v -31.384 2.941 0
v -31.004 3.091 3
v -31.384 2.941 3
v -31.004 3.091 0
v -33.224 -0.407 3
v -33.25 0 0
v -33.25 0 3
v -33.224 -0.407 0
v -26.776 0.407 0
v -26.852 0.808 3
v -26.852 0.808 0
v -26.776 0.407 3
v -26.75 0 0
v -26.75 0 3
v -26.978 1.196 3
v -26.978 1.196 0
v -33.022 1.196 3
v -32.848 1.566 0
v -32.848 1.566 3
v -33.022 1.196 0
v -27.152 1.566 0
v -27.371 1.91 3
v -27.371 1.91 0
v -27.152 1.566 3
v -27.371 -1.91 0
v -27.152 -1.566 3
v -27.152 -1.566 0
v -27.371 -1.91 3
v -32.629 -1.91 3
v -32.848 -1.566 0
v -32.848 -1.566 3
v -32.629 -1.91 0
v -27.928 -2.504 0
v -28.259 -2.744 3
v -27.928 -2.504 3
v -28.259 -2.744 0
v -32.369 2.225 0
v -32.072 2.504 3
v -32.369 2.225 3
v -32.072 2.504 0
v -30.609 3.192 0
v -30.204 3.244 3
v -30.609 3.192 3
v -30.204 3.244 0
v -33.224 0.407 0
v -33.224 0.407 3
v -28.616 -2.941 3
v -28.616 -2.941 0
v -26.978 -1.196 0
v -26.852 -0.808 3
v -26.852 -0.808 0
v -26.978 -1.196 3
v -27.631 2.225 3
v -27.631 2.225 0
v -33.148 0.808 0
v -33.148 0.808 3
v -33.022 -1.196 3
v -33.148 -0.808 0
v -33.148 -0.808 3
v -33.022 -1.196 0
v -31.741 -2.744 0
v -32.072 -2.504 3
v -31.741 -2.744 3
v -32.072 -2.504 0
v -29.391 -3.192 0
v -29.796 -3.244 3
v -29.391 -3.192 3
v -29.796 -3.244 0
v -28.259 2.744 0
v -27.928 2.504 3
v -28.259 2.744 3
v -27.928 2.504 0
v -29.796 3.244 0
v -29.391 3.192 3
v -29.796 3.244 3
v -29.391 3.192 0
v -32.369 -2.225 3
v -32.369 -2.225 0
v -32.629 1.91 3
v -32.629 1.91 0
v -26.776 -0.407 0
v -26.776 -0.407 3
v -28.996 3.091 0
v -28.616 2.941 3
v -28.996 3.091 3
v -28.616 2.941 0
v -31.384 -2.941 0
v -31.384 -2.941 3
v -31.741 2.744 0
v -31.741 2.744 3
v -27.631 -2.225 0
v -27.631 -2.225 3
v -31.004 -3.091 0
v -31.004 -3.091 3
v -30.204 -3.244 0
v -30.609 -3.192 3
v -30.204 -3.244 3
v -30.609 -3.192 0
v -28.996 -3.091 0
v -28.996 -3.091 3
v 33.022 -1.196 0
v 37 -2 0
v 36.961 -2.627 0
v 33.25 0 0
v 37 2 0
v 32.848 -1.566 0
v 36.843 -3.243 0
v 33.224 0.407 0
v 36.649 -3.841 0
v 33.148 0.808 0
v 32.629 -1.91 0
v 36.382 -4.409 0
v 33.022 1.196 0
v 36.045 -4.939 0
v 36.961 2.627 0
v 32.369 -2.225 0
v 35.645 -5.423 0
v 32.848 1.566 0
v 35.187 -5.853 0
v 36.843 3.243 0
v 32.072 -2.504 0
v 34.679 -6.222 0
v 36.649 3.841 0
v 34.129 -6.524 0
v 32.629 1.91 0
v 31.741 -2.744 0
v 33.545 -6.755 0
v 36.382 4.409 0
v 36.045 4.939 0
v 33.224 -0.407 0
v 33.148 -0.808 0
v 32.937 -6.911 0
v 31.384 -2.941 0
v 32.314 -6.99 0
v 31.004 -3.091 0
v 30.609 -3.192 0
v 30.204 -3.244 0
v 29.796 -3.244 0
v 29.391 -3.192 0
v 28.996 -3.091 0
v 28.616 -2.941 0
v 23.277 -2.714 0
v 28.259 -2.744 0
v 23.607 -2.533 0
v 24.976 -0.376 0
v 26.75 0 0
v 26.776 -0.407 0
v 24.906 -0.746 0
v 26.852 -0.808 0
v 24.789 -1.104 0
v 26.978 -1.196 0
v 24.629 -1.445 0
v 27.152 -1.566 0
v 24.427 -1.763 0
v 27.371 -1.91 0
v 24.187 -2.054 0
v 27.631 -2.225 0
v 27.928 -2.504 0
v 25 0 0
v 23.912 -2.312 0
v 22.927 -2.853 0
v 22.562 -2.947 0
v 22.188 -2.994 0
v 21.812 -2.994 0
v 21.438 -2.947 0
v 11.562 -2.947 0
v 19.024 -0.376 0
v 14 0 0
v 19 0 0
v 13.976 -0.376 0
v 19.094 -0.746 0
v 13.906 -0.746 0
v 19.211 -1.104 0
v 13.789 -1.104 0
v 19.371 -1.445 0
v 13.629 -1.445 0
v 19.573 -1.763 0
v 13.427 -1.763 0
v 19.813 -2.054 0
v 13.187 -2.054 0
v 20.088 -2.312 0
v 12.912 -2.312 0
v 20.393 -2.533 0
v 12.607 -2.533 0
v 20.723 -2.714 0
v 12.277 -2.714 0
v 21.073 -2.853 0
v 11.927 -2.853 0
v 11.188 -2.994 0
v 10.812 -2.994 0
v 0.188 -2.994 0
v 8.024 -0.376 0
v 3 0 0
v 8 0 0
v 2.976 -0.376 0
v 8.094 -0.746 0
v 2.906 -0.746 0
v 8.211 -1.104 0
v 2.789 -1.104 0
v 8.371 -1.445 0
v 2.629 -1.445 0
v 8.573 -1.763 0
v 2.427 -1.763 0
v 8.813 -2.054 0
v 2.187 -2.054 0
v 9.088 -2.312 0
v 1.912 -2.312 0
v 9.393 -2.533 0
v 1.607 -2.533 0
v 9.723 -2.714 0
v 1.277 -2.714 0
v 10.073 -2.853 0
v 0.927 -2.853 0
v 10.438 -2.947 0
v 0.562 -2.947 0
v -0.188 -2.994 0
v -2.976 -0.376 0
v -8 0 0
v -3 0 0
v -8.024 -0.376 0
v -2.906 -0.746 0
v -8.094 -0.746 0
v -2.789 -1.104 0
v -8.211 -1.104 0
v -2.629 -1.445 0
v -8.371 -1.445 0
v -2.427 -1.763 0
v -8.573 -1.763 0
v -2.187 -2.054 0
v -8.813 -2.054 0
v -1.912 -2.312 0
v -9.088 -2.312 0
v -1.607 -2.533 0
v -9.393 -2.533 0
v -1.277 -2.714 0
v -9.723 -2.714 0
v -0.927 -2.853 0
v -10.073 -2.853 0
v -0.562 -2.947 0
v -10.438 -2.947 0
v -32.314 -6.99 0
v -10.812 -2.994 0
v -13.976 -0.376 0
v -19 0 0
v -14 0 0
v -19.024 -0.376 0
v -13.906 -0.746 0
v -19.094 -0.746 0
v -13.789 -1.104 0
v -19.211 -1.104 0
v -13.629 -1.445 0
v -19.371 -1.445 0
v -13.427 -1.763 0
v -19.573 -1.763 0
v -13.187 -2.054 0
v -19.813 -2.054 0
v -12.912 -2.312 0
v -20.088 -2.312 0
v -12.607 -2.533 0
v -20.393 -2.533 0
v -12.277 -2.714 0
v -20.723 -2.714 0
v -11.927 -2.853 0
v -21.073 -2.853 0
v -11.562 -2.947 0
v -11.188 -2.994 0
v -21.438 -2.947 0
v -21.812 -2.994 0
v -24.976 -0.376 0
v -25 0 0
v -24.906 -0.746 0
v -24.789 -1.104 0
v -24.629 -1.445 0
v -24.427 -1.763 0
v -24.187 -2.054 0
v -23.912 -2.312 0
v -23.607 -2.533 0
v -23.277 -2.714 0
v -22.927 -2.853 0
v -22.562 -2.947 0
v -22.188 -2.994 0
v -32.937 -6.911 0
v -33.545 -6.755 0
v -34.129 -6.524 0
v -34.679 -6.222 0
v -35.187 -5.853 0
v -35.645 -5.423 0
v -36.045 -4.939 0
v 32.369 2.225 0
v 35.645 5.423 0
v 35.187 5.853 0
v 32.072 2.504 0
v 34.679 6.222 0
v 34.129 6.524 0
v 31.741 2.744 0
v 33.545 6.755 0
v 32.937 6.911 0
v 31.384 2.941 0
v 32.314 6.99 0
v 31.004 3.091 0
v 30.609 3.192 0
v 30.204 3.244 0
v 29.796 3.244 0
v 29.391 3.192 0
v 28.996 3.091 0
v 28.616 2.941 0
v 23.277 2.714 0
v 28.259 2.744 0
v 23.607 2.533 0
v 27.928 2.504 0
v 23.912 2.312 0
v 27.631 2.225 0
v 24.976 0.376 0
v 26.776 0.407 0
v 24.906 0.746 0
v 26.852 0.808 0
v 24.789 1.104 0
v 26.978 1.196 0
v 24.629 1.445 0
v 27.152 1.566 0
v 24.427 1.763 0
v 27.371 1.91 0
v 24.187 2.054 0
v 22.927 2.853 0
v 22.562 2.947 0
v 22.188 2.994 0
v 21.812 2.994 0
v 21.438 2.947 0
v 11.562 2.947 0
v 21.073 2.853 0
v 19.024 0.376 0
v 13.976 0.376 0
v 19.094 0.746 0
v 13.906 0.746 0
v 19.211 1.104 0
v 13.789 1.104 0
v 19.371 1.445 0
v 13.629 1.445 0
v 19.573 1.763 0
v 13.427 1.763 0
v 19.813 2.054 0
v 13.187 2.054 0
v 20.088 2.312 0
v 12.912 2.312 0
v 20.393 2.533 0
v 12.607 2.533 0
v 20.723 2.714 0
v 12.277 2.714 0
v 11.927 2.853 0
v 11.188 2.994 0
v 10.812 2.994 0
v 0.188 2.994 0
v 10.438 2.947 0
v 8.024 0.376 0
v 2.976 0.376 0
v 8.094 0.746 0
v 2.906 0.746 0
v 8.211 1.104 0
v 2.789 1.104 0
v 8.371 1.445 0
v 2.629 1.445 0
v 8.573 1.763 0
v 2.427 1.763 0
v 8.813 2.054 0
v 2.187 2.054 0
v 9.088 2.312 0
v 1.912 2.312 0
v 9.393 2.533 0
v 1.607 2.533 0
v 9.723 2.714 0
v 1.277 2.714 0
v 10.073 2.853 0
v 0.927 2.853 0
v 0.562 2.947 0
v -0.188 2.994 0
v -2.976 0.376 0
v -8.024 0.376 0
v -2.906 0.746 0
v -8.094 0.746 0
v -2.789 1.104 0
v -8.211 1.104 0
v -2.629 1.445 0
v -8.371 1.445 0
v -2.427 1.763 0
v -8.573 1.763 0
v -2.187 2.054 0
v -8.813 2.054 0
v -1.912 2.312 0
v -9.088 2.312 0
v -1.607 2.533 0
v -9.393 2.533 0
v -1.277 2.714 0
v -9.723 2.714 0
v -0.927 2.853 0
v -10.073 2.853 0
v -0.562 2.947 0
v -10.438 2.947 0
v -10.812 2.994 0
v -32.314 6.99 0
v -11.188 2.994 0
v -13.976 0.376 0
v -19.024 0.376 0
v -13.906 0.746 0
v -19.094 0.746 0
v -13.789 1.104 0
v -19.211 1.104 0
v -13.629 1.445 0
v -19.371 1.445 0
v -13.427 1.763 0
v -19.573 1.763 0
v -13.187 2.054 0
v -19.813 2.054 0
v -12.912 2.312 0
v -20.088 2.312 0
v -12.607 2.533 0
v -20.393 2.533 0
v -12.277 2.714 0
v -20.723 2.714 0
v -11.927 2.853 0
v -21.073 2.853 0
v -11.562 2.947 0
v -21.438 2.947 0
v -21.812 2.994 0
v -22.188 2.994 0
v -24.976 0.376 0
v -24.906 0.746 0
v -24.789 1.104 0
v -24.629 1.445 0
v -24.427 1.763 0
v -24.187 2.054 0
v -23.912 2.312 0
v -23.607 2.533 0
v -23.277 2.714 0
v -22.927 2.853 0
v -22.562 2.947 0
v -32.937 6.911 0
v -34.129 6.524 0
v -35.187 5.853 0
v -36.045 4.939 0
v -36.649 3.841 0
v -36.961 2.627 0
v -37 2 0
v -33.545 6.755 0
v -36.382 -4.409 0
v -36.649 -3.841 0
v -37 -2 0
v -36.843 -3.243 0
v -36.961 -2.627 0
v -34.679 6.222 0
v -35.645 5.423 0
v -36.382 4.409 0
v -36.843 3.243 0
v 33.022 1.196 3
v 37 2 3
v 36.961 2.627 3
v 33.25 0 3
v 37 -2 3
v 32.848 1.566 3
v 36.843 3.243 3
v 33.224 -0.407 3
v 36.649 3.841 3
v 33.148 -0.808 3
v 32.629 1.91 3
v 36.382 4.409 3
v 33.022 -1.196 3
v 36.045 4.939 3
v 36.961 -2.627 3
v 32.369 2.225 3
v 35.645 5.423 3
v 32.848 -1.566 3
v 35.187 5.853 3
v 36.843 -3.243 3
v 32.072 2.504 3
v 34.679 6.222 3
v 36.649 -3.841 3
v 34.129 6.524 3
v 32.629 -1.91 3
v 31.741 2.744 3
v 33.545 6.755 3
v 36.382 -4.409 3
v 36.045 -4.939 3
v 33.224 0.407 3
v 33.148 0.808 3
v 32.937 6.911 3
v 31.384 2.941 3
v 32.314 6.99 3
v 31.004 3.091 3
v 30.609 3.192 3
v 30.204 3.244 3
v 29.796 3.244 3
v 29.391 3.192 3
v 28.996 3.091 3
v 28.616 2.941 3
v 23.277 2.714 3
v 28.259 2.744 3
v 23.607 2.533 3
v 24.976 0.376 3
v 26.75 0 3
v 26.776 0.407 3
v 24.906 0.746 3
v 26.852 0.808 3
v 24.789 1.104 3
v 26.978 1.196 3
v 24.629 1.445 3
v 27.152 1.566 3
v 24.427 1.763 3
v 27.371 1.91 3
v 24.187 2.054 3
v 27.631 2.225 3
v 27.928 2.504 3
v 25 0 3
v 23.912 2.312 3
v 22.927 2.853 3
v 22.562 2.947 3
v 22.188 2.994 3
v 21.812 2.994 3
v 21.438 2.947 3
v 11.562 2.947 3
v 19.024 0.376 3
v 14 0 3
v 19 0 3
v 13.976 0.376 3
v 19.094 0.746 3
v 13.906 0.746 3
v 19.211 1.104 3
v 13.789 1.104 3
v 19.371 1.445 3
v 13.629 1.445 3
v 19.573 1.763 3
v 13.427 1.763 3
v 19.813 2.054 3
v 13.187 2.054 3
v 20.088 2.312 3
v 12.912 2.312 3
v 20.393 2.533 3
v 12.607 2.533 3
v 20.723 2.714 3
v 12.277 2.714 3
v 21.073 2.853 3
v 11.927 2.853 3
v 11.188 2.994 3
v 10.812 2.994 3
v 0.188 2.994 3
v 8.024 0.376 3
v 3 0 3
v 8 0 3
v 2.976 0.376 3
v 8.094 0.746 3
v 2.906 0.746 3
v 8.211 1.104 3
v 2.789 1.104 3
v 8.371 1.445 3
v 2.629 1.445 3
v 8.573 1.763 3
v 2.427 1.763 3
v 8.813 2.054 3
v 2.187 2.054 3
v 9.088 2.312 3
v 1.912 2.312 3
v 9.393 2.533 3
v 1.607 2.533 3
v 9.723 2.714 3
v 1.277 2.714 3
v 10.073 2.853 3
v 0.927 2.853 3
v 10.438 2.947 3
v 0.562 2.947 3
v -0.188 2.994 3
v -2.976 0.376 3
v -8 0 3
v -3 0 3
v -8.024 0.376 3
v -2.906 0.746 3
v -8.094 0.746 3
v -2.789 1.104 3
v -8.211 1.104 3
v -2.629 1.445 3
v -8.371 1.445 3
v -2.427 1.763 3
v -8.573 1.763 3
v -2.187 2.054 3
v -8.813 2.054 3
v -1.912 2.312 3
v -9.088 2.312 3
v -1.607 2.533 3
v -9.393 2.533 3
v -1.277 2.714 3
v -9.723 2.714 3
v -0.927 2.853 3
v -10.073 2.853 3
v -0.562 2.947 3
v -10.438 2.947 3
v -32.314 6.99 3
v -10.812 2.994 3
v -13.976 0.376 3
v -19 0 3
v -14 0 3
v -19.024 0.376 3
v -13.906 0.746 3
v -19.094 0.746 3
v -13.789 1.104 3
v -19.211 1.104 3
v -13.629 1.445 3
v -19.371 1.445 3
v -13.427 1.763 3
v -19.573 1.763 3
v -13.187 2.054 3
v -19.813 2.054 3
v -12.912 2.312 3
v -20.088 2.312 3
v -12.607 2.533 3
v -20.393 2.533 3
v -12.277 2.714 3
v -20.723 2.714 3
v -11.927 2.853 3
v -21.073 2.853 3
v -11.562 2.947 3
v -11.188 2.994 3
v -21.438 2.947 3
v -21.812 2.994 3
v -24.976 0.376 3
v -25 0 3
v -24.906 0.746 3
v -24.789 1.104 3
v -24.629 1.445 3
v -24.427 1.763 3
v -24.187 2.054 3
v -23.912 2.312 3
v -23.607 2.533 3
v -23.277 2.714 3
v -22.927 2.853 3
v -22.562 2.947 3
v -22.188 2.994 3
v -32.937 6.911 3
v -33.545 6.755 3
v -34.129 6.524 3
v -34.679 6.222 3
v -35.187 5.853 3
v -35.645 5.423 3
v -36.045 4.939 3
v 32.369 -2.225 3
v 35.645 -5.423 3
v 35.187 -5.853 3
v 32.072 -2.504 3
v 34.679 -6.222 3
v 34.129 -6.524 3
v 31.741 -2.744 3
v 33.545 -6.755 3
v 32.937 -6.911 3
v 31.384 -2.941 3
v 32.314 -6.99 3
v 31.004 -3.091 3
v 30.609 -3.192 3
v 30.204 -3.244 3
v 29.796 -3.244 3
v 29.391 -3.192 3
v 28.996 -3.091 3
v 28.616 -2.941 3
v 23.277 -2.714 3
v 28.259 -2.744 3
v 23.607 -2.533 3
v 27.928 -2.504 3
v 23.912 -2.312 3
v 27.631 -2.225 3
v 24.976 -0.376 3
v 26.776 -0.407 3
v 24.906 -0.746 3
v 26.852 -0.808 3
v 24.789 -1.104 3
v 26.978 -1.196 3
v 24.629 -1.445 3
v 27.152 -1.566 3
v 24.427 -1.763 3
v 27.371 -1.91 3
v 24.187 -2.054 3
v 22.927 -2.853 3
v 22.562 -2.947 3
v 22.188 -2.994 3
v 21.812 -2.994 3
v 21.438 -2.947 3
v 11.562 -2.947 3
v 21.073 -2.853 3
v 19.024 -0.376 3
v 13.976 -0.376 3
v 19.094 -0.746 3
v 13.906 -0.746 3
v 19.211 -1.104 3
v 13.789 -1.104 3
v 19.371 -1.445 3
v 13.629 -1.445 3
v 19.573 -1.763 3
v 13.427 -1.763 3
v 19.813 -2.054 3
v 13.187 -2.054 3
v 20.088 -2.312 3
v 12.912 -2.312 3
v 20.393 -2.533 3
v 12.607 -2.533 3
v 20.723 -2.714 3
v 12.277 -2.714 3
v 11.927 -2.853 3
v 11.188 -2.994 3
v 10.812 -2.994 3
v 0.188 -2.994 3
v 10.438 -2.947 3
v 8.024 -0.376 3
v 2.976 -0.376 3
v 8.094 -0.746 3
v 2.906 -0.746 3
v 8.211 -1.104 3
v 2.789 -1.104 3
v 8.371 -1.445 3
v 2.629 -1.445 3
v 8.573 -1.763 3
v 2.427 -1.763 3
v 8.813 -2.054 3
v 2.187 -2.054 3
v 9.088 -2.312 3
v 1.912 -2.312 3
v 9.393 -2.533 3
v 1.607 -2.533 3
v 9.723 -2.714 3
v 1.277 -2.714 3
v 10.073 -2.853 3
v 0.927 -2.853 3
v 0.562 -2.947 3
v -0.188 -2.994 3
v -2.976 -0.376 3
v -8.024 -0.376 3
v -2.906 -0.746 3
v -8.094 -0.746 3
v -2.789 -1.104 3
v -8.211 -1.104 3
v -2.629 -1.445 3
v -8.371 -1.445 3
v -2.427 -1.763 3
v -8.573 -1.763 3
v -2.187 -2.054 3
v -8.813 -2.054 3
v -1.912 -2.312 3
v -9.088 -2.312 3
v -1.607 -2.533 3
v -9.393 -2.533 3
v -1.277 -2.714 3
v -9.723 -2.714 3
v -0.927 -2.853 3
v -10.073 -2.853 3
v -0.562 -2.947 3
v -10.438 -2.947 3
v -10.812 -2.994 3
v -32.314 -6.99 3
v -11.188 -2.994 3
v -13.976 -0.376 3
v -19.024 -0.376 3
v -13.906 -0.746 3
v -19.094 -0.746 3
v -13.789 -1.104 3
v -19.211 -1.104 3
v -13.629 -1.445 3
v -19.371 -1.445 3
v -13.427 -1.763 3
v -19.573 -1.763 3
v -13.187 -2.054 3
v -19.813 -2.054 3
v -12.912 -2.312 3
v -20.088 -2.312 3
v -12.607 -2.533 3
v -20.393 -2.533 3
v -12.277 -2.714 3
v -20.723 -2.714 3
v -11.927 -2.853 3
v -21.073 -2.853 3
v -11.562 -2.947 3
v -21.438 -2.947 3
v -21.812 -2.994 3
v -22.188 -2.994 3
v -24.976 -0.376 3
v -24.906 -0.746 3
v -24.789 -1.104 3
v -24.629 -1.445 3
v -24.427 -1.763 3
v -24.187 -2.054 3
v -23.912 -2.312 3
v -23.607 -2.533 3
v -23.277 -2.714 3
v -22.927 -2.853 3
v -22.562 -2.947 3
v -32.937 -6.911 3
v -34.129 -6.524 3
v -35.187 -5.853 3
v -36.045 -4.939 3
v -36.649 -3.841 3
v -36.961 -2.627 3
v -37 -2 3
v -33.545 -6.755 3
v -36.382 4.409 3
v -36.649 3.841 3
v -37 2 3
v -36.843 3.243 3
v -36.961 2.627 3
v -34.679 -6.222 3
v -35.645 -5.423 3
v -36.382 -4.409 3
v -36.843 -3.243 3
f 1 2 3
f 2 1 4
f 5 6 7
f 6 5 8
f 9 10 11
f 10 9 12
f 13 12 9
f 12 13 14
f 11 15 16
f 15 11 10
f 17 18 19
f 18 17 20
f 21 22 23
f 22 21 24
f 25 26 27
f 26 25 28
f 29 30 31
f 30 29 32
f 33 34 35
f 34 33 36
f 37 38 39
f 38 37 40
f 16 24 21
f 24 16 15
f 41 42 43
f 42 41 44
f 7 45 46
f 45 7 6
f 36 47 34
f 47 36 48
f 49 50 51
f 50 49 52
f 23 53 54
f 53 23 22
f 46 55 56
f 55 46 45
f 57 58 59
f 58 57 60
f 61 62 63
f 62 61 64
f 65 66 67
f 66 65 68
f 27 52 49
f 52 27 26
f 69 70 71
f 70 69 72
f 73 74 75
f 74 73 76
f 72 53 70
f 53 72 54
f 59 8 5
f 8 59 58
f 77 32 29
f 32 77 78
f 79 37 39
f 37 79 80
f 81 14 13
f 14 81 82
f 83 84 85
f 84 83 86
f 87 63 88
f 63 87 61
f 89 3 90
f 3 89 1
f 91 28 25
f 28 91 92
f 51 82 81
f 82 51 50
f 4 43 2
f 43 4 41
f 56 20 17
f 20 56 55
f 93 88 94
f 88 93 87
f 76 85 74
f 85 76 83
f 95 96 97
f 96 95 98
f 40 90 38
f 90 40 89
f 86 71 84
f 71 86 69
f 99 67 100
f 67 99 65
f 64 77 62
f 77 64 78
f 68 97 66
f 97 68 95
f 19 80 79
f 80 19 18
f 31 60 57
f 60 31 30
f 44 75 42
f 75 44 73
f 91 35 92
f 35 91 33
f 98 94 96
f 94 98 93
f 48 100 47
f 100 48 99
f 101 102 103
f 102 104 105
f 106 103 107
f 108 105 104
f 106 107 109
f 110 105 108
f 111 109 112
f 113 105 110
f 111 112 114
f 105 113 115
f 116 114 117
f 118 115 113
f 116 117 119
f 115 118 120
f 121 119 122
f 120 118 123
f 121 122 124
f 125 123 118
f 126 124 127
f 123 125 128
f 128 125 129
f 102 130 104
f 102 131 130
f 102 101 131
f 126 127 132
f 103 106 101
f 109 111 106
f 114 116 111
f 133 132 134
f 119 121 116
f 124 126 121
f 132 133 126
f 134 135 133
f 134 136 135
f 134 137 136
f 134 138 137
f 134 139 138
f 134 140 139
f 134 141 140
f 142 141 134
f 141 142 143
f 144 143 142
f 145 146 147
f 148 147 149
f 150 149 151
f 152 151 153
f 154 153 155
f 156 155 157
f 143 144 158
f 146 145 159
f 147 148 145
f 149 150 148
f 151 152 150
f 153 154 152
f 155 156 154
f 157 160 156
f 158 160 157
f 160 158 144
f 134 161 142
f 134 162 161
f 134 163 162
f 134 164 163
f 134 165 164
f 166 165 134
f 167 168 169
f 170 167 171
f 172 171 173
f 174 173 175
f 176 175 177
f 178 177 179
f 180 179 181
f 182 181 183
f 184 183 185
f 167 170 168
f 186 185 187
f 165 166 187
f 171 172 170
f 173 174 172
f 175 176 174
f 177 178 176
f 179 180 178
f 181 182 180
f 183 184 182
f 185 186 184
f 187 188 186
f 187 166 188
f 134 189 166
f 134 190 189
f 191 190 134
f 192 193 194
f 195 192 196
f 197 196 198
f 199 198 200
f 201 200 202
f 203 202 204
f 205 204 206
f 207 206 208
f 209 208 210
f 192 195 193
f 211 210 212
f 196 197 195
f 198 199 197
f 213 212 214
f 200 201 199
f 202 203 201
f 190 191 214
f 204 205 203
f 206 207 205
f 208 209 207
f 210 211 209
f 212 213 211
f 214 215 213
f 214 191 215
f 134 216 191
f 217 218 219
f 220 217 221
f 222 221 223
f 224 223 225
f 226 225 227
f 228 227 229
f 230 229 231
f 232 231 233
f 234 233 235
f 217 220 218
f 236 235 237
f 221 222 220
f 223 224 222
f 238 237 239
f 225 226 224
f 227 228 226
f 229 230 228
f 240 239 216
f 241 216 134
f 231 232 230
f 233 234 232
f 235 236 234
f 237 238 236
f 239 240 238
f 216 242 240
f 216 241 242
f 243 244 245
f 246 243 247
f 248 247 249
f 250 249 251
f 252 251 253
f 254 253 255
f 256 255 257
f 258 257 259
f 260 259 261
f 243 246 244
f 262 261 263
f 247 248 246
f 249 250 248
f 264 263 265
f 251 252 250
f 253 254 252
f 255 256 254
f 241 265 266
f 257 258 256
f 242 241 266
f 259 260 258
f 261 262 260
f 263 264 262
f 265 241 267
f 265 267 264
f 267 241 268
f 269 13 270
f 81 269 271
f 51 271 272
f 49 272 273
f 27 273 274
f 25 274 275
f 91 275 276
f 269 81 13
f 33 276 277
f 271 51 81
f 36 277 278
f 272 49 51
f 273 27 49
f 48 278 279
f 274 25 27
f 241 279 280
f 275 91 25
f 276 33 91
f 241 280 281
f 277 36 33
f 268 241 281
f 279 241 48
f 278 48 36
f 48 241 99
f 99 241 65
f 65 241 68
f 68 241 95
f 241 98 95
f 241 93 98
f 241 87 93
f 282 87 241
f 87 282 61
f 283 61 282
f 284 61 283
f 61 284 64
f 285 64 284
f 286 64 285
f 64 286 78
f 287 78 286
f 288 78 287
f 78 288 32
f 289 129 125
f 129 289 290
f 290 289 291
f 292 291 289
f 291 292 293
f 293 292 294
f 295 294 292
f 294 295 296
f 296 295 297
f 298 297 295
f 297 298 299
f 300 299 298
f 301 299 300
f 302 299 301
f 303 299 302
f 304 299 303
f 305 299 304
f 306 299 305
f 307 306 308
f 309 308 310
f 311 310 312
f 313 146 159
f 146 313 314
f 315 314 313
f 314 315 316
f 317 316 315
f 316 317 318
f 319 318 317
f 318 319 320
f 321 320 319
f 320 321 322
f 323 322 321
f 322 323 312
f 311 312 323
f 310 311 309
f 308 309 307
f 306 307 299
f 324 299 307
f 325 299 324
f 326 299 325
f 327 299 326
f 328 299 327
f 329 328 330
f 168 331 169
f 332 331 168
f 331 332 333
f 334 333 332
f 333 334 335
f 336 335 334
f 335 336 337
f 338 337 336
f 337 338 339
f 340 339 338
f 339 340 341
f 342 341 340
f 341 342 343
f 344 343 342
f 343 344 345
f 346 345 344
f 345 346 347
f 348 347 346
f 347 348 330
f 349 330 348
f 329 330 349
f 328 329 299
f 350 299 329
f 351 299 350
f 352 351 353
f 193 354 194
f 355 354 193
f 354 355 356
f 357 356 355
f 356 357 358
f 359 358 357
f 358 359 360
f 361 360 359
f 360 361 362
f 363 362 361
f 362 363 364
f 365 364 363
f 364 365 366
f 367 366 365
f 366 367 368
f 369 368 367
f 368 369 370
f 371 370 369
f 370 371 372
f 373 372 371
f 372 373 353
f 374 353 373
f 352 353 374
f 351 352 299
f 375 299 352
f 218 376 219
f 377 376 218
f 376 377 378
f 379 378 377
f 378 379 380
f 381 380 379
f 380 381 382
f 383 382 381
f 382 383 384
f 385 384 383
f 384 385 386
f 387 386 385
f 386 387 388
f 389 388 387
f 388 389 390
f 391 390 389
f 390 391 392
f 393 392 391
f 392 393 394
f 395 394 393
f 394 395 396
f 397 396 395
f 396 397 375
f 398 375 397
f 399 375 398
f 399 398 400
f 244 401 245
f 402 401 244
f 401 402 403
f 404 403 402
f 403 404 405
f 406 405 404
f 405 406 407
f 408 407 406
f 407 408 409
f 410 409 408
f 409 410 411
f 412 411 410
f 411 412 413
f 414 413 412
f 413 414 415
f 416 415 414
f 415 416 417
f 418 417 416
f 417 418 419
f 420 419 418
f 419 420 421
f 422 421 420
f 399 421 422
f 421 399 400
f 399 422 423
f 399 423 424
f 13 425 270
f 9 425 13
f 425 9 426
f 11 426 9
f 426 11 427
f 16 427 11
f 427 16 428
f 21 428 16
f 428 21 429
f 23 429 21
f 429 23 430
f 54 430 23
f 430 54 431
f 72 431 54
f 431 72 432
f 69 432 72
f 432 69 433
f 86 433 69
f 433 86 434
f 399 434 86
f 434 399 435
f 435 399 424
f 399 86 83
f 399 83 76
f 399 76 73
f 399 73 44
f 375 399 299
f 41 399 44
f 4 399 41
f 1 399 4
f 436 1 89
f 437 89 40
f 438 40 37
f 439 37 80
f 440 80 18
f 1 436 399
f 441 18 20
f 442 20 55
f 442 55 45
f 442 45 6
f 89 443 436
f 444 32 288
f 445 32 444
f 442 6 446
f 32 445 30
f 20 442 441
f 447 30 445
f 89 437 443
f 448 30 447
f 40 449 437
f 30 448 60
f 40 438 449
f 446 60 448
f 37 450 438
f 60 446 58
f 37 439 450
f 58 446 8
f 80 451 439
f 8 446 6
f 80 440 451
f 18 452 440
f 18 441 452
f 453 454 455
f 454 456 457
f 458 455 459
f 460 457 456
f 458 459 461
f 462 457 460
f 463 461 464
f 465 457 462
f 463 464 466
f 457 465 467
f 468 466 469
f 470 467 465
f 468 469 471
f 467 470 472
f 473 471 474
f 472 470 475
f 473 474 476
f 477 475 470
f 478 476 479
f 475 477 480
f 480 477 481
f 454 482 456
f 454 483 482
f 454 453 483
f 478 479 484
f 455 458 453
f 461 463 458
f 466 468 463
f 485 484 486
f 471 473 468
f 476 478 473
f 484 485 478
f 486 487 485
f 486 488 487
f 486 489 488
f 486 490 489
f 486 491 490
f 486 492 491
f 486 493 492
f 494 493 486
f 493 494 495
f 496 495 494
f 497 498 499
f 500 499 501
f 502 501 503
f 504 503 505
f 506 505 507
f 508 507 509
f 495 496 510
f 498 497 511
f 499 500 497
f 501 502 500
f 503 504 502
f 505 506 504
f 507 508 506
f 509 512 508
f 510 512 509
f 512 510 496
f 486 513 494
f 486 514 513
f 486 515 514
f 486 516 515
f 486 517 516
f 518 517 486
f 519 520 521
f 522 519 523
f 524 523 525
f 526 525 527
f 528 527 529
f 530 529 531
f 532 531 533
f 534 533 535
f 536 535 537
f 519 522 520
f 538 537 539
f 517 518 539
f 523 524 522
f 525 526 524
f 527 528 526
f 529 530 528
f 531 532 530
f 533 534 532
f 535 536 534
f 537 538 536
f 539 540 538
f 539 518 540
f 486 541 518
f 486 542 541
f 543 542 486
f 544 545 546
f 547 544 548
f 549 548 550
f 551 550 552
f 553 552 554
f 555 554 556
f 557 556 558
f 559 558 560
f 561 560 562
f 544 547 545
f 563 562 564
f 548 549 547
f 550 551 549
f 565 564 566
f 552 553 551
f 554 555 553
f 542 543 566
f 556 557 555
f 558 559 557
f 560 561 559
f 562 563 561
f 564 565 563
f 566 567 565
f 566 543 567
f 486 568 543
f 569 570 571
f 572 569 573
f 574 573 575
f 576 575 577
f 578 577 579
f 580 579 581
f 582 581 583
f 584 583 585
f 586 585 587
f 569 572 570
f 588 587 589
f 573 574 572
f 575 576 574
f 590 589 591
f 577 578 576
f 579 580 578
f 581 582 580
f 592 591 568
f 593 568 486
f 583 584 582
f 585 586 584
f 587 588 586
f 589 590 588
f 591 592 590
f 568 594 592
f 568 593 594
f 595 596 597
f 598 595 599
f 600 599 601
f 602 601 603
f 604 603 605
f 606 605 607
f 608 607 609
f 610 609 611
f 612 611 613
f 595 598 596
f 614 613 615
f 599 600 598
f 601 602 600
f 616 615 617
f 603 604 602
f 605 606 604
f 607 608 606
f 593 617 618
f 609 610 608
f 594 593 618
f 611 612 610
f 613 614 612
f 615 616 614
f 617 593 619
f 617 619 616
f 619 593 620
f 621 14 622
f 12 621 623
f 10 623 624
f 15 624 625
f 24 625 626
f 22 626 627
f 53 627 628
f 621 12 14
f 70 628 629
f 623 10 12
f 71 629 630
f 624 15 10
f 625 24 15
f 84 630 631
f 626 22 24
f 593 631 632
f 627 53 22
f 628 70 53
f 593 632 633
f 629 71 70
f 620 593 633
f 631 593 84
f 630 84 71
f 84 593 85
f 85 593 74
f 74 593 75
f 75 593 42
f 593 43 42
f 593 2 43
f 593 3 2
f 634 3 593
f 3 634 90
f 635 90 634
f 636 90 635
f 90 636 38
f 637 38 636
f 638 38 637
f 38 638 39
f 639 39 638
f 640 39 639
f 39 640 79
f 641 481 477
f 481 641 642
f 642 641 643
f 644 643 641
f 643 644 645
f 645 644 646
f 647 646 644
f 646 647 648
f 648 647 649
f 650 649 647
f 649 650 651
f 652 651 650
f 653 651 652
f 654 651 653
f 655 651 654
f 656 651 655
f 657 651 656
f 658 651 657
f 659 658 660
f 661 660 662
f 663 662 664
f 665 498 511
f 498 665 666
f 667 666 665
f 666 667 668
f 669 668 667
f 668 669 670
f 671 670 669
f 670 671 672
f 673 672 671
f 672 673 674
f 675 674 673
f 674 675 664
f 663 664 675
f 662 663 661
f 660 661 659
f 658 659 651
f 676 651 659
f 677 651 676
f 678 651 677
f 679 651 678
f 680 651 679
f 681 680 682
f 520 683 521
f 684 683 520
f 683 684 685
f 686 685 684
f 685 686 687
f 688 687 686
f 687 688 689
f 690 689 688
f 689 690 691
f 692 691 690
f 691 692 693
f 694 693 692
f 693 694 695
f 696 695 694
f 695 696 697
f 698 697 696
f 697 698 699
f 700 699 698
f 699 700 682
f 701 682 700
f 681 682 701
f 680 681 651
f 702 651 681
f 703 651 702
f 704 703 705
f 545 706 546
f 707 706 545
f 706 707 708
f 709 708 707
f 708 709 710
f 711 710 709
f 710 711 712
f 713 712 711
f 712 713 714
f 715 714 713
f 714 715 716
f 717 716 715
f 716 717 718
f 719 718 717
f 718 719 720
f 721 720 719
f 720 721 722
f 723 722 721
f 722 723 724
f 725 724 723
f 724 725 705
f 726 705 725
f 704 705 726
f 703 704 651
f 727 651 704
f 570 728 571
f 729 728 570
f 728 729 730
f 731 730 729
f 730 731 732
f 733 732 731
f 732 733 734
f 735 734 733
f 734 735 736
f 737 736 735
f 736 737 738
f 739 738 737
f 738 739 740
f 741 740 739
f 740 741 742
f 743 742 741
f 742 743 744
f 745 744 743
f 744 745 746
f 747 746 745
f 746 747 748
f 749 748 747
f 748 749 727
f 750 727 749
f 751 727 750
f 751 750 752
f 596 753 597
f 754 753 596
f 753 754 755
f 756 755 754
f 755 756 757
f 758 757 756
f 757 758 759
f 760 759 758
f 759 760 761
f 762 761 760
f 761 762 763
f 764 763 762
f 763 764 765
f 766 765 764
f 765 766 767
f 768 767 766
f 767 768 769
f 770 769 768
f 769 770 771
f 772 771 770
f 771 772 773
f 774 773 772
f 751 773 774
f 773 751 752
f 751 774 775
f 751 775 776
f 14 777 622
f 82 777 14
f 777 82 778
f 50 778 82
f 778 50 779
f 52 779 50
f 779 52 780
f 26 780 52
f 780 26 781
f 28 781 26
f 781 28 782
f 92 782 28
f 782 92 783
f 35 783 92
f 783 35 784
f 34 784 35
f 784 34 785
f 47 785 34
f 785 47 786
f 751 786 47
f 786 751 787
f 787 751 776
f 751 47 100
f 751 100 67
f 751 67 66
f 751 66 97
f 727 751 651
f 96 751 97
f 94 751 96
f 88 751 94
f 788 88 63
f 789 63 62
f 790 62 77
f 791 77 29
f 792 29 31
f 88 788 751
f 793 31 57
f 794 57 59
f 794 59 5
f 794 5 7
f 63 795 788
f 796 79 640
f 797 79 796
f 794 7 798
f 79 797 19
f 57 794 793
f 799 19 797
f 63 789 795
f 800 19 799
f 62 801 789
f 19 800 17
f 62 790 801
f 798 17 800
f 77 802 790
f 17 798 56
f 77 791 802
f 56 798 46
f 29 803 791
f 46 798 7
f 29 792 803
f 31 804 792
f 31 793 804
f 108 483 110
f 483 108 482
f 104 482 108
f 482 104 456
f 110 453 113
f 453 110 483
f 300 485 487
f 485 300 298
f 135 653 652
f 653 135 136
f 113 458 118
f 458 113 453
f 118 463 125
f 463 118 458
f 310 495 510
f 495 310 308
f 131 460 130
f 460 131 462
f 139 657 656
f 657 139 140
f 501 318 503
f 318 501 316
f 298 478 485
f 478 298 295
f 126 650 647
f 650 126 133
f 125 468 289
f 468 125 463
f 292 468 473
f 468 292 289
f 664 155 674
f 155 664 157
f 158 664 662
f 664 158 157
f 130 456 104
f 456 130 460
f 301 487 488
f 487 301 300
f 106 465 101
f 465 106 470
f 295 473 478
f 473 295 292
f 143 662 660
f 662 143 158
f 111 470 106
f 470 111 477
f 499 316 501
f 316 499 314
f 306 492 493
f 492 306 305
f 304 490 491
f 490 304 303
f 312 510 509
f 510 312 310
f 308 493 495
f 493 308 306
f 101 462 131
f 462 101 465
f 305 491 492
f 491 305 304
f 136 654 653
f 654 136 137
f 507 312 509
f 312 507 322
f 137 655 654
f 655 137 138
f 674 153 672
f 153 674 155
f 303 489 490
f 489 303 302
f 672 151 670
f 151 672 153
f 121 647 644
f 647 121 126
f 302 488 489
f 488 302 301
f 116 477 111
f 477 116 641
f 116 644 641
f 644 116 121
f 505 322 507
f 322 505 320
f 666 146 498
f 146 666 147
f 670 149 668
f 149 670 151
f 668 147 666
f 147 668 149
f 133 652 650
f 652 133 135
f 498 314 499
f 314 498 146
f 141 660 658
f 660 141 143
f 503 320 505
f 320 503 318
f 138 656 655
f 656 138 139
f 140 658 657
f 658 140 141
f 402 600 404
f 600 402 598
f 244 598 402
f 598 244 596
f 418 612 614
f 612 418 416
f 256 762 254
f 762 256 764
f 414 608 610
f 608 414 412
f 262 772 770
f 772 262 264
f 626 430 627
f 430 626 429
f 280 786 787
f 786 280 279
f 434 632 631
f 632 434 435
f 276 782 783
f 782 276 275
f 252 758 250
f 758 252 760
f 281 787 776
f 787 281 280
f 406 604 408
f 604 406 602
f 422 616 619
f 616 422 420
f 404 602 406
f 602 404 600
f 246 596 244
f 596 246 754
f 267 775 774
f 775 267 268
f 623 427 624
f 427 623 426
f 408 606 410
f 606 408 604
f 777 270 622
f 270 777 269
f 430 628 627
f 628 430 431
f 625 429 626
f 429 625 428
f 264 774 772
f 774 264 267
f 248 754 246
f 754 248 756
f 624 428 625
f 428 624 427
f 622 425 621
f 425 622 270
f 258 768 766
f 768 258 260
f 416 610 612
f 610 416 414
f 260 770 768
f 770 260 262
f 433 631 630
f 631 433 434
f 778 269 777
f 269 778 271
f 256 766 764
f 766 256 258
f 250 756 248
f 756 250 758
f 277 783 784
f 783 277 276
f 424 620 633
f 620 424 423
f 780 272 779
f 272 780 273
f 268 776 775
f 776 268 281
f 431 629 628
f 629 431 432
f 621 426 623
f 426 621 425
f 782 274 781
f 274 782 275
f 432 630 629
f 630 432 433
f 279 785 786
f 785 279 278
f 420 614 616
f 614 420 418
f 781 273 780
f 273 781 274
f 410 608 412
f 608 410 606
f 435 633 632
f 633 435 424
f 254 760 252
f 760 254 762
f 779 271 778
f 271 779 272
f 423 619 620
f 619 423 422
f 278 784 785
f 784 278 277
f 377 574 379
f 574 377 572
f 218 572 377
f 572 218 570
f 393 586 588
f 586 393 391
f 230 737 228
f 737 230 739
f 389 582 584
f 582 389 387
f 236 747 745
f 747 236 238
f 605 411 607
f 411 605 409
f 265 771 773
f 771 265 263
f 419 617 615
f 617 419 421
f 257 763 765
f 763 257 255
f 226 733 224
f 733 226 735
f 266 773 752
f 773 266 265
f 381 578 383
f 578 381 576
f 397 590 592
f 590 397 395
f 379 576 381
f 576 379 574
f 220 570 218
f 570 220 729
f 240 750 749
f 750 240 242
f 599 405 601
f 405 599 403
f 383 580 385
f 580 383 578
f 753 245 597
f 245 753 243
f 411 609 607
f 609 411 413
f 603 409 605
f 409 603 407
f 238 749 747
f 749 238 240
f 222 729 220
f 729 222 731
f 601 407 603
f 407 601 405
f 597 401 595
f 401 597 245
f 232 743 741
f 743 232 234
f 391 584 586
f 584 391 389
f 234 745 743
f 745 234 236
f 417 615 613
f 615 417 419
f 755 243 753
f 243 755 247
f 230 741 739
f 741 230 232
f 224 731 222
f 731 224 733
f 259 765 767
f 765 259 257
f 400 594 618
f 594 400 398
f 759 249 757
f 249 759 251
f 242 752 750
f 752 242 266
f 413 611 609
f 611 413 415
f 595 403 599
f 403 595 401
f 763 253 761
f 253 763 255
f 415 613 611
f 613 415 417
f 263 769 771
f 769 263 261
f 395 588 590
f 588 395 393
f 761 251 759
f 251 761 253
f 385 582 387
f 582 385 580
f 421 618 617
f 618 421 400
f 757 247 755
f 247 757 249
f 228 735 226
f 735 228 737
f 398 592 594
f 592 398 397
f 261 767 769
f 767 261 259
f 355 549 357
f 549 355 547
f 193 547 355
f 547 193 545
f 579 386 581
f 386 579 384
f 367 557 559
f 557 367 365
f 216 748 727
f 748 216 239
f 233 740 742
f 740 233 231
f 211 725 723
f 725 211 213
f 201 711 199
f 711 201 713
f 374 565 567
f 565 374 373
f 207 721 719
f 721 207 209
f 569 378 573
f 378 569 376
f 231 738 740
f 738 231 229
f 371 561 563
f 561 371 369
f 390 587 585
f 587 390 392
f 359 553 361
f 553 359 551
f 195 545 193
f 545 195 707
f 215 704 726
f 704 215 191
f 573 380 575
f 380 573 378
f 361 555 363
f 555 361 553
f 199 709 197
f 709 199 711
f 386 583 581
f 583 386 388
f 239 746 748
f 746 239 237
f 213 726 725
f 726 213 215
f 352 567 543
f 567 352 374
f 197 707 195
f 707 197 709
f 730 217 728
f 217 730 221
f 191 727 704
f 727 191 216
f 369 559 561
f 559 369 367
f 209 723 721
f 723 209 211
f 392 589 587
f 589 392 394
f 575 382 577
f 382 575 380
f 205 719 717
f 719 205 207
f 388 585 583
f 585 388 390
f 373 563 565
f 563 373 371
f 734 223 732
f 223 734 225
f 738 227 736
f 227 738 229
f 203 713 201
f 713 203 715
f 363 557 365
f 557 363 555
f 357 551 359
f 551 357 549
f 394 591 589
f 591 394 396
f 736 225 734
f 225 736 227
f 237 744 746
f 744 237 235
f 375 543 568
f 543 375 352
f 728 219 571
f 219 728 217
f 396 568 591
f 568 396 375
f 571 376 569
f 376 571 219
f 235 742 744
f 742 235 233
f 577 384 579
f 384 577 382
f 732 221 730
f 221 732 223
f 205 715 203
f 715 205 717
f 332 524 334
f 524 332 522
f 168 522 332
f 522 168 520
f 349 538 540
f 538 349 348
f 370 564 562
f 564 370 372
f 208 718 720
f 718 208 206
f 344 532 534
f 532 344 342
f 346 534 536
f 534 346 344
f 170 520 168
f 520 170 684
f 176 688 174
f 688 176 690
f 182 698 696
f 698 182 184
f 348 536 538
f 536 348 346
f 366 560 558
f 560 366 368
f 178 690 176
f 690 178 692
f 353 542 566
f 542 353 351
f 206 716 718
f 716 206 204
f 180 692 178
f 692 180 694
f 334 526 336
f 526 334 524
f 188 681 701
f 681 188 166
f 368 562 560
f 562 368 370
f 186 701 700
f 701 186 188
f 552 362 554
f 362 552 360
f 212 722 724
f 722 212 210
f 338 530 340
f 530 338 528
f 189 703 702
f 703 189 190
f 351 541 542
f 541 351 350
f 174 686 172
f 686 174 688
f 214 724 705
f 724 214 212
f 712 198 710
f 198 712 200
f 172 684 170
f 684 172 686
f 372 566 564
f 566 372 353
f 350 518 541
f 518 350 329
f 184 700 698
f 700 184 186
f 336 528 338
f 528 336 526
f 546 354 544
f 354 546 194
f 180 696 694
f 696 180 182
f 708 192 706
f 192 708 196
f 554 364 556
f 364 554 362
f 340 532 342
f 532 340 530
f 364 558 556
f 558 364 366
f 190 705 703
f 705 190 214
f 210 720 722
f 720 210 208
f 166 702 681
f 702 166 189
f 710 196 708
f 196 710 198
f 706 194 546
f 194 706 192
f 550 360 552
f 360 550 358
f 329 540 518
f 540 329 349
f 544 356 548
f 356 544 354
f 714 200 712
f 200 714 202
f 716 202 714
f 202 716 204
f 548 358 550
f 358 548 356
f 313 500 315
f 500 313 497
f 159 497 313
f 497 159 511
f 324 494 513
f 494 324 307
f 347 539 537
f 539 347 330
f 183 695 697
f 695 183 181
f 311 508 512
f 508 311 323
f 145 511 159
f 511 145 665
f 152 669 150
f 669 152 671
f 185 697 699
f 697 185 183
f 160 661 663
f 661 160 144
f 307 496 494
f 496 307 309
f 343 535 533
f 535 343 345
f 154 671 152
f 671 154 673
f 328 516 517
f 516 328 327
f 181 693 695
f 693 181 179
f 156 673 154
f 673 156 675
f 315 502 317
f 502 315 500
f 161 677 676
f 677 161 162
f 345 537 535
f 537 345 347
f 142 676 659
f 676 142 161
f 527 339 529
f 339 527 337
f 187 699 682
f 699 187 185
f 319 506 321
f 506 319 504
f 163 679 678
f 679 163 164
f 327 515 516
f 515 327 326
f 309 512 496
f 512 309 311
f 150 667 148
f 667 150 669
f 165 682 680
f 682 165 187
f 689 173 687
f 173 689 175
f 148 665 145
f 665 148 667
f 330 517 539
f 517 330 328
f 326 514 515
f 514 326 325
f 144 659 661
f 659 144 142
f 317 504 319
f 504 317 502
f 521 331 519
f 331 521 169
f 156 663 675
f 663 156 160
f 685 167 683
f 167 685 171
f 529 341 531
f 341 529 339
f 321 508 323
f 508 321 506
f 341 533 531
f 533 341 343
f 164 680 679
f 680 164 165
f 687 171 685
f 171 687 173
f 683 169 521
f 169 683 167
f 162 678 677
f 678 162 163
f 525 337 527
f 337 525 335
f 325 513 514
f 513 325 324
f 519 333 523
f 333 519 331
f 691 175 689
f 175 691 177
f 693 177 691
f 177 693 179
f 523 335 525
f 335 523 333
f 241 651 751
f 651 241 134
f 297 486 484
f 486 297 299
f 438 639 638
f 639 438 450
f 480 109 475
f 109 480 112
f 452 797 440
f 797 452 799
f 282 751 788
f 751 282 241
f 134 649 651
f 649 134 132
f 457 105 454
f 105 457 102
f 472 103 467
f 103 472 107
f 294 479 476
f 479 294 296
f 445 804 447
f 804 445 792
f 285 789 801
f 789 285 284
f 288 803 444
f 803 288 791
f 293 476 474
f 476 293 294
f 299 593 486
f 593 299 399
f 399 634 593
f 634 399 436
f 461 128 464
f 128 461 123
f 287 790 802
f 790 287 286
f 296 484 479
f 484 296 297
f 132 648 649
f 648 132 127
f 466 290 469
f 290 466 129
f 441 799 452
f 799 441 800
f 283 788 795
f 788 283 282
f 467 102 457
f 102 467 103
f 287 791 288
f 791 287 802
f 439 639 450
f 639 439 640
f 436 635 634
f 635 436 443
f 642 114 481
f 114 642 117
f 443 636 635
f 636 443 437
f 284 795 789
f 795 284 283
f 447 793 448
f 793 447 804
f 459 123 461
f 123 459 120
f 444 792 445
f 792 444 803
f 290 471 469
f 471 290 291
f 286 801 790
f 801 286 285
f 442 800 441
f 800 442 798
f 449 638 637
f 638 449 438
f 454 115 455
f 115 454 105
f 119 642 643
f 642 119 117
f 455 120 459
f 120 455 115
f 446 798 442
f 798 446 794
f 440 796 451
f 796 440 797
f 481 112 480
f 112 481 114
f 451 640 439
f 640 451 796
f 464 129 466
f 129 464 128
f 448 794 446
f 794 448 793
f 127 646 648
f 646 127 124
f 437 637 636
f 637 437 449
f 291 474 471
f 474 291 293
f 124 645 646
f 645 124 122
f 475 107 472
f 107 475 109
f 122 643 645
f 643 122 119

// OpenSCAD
$fn = 50;

difference() {
	union() {
		hull() {
			translate(v = [-32.0, 2.0, 0]) {
				cylinder(h = 3, r = 5);
			}
			translate(v = [32.0, 2.0, 0]) {
				cylinder(h = 3, r = 5);
			}
			translate(v = [-32.0, -2.0, 0]) {
				cylinder(h = 3, r = 5);
			}
			translate(v = [32.0, -2.0, 0]) {
				cylinder(h = 3, r = 5);
			}
		}
	}
	union() {
		translate(v = [-30.0, 0.0, 0]) {
			cylinder(h = 3, r = 3.25);
		}
		translate(v = [30.0, 0.0, 0]) {
			cylinder(h = 3, r = 3.25);
		}
		translate(v = [-22.0, 0, 0.0]) {
			cylinder(h = 3, r = 3.0);
		}
		translate(v = [-11.0, 0, 0.0]) {
			cylinder(h = 3, r = 3.0);
		}
		cylinder(h = 3, r = 3.0);
		translate(v = [11.0, 0, 0.0]) {
			cylinder(h = 3, r = 3.0);
		}
		translate(v = [22.0, 0, 0.0]) {
			cylinder(h = 3, r = 3.0);
		}
	}
}
